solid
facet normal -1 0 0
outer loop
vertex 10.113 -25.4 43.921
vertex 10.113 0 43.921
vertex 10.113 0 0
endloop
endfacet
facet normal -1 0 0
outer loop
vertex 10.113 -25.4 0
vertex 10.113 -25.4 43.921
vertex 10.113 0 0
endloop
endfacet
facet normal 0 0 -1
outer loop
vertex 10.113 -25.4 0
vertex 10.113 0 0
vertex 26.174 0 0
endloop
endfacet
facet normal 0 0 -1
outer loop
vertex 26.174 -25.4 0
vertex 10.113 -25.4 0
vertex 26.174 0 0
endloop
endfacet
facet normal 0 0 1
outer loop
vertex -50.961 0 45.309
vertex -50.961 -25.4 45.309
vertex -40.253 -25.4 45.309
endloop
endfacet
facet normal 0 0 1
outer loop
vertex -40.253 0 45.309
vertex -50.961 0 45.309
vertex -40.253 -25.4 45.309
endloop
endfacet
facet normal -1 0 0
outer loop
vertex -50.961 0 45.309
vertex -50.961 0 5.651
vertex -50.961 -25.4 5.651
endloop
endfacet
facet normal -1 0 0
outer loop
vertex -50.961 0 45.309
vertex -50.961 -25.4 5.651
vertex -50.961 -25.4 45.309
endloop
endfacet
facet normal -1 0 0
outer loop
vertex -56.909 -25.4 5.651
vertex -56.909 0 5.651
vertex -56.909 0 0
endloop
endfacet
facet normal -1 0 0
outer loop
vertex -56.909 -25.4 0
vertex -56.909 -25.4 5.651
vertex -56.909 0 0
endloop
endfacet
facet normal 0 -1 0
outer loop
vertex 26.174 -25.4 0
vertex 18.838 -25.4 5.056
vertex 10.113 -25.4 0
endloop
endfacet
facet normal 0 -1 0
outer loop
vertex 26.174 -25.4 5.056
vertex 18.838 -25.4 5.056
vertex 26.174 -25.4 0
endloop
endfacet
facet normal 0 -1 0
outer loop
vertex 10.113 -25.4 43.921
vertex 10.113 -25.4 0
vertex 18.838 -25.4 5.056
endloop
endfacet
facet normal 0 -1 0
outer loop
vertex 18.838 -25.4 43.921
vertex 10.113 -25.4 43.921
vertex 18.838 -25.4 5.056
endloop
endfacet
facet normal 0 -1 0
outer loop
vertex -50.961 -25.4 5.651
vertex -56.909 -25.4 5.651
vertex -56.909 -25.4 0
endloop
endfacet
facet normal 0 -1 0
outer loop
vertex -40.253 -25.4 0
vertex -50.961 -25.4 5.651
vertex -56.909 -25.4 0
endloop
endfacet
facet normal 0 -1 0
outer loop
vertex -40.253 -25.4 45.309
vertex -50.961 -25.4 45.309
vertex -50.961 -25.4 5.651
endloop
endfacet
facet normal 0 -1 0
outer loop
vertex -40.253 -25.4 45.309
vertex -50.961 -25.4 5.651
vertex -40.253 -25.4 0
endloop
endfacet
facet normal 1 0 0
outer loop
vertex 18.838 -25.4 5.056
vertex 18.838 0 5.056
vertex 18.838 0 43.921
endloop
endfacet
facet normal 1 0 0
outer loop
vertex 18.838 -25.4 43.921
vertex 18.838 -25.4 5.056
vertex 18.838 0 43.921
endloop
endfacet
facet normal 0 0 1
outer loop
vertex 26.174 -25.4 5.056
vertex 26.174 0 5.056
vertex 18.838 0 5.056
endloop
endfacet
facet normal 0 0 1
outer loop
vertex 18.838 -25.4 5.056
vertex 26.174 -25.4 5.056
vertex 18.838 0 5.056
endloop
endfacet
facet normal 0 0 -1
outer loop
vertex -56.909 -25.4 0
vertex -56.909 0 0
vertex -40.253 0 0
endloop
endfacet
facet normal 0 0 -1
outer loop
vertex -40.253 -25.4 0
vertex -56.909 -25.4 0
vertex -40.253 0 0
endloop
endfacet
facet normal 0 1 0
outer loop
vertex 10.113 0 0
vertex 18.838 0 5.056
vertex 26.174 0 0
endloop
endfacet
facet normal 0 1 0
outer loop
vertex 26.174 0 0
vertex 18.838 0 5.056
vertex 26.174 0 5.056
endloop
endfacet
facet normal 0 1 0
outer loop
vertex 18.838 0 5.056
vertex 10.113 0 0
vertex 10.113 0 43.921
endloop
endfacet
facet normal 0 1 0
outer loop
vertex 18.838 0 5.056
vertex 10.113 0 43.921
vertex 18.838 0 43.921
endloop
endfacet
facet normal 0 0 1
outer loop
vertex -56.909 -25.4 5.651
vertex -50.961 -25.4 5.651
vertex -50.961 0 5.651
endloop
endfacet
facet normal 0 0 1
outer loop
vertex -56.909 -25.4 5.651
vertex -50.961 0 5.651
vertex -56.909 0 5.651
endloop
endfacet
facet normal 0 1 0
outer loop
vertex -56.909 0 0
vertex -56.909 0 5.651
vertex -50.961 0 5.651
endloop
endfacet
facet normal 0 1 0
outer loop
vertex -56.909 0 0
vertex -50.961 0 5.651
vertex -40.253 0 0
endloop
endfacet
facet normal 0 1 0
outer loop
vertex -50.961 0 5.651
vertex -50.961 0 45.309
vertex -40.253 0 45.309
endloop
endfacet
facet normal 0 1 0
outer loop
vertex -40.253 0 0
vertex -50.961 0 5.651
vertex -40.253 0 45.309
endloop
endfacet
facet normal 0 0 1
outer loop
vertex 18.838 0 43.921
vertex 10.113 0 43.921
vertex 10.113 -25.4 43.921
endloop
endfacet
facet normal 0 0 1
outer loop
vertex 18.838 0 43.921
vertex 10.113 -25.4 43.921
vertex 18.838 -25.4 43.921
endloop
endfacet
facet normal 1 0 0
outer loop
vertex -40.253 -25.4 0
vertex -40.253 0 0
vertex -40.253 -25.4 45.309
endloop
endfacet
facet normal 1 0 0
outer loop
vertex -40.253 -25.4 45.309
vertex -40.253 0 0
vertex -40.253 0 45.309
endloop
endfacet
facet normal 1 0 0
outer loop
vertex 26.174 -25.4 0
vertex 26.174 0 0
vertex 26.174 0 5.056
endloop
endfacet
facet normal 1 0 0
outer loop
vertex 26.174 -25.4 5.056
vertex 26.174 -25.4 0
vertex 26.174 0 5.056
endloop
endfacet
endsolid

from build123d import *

# Parameters (mm, degrees)
F0_W     = 10.707658
F0_H     = 39.657993
F0_W_2   = 8.724758
F0_H_2   = 38.864834
F1_DEPTH = 25.4


with BuildPart() as f1:
    # F0 (on Front) → F1 (new body)
    with BuildSketch(Plane.XZ):
        with Locations((-45.606693, 25.48026)):
            Rectangle(F0_W, F0_H)
        Polygon((-40.252864, 5.651264), (-50.960522, 5.651264), (-56.909218, 5.651264), (-56.909218, 0), (-40.252864, 0), align=None)
        with Locations((14.475168, 24.488811)):
            Rectangle(F0_W_2, F0_H_2)
        Polygon((18.837547, 5.056394), (10.112789, 5.056394), (10.112789, 0), (26.174277, 0), (26.174277, 5.056394), align=None)
    extrude(amount=F1_DEPTH)


solid = f1.part
